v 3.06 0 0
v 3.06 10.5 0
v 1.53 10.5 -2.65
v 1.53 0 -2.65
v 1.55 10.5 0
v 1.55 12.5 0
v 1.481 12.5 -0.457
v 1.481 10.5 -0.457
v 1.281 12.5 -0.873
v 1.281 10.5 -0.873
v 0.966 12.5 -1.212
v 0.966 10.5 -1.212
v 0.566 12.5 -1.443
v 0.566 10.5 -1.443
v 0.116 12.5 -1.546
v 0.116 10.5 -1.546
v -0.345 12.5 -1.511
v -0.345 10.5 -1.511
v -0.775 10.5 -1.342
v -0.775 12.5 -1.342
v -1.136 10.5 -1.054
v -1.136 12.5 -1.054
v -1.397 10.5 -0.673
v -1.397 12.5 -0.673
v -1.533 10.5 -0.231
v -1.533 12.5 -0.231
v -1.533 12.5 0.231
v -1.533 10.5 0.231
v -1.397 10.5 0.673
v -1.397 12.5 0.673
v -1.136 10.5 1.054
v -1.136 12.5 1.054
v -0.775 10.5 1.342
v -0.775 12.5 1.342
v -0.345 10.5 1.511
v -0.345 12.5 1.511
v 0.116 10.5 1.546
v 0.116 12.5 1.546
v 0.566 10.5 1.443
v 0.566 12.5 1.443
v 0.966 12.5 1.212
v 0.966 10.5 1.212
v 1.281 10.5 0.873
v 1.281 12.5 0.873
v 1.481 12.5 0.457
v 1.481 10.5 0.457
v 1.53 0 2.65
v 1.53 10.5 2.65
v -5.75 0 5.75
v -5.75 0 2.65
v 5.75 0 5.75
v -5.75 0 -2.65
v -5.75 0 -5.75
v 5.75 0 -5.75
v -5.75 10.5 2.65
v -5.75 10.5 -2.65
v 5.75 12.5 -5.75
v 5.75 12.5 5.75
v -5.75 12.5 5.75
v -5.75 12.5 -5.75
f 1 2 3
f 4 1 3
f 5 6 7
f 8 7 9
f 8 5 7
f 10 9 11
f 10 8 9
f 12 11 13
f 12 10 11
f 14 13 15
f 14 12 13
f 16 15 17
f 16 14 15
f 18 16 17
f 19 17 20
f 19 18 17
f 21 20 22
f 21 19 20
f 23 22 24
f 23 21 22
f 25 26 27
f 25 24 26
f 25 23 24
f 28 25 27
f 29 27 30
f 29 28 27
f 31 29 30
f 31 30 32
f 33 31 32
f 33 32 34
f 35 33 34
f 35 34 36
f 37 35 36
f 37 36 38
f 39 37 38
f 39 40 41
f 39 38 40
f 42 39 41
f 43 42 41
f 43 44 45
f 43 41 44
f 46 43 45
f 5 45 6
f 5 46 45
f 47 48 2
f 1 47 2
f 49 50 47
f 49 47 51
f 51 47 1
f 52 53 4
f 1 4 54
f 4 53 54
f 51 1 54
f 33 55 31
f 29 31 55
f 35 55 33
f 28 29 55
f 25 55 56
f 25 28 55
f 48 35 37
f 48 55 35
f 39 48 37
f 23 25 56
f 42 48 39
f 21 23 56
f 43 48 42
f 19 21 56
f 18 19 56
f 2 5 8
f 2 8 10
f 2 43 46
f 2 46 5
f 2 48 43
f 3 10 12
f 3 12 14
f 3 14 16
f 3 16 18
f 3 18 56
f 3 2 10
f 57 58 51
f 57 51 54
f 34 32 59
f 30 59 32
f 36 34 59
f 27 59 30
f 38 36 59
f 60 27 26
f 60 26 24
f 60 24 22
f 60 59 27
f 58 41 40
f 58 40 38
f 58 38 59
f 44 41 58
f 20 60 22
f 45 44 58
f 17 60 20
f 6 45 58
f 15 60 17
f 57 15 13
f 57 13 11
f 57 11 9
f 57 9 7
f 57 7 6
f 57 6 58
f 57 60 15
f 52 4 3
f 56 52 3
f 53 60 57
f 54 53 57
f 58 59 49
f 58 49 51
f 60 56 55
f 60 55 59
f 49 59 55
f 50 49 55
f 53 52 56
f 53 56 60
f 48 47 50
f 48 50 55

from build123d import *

# Parameters (mm, degrees)
SKETCH3_W           = 11.5
SKETCH3_H           = 11.5
BOSS_EXTRUDE1_DEPTH = 12.5
SKETCH4_R           = 1.55
CUT_EXTRUDE1_DEPTH  = 3
CUT_EXTRUDE2_DEPTH  = 11.5
SKETCH6_W           = 5.3
SKETCH6_H           = 10.5
CUT_EXTRUDE3_DEPTH  = 6.75


with BuildPart() as part:
    # Sketch3 → Boss-Extrude1 (new body)
    with BuildSketch(Plane(origin=(0, 0, 0), x_dir=(1, 0, 0), z_dir=(0, 1, 0))):
        Rectangle(SKETCH3_W, SKETCH3_H)
    extrude(amount=BOSS_EXTRUDE1_DEPTH)

    # Sketch4 → Cut-Extrude1 (cut, through all)
    with BuildSketch(Plane(origin=(0, 10.5, 0), x_dir=(1, 0, 0), z_dir=(0, 1, 0))):
        Circle(SKETCH4_R)
    extrude(amount=CUT_EXTRUDE1_DEPTH, mode=Mode.SUBTRACT)

    # Sketch5 → Cut-Extrude2 (cut, through all)
    with BuildSketch(Plane(origin=(0, 10.5, 0), x_dir=(1, 0, 0), z_dir=(0, 1, 0))):
        Polygon((3.059956427, 0), (1.529978213, 2.65), (-1.529978213, 2.65), (-3.059956427, 0), (-1.529978213, -2.65), (1.529978213, -2.65), align=None)
    extrude(amount=-CUT_EXTRUDE2_DEPTH, mode=Mode.SUBTRACT)

    # Sketch6 → Cut-Extrude3 (cut, through all)
    with BuildSketch(Plane(origin=(0, 0, 0), x_dir=(0, 0, -1), z_dir=(1, 0, 0))):
        with Locations((0, 5.25)):
            Rectangle(SKETCH6_W, SKETCH6_H)
    extrude(amount=-CUT_EXTRUDE3_DEPTH, mode=Mode.SUBTRACT)


solid = part.part
